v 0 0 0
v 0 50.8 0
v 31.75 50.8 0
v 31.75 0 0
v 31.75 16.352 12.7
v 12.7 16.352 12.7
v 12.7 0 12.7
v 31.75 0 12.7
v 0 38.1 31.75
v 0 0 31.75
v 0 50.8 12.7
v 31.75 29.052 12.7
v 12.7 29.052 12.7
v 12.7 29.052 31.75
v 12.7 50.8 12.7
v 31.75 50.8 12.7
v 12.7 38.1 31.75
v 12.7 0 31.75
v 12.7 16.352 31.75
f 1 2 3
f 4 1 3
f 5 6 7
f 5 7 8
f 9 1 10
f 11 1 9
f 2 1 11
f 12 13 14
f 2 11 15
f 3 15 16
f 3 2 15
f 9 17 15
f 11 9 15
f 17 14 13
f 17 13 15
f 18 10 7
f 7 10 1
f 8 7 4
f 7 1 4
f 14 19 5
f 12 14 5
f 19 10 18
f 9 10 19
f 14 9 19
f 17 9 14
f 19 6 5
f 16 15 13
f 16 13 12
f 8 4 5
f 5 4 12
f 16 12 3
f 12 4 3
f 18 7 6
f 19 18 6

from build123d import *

# Parameters (mm, degrees)
F0_W     = 31.75
F0_H     = 50.8
F1_DEPTH = 12.7
F2_W     = 12.7
F2_H     = 50.8
F3_DEPTH = 19.05
F5_DEPTH = 25.4
F6_W     = 12.7
F6_H     = 19.05
F7_DEPTH = 19.05
F9_DEPTH = 25.4


with BuildPart() as f1:
    # F0 (on Top) → F1 (new body)
    with BuildSketch(Plane.XY):
        with Locations((15.875, 25.4)):
            Rectangle(F0_W, F0_H)
    extrude(amount=F1_DEPTH)

    # F2 (on face) → F3 (join)
    with BuildSketch(Plane.XY.offset(12.7)):
        with Locations((6.35, 25.4)):
            Rectangle(F2_W, F2_H)
    extrude(amount=F3_DEPTH)

    # F4 (on face) → F5 (cut)
    with BuildSketch(Plane.YZ.offset(12.7)):
        Polygon((50.8, 12.7), (50.8, 31.75), (38.1, 31.75), align=None)
    extrude(amount=-F5_DEPTH, mode=Mode.SUBTRACT)

    # F6 (on face) → F7 (join)
    with BuildSketch(Plane.YZ.offset(12.7)):
        with Locations((22.702408, 22.225)):
            Rectangle(F6_W, F6_H)
    extrude(amount=F7_DEPTH)

    # F8 (on face) → F9 (cut)
    with BuildSketch(Plane.XZ.offset(-16.352408)):
        Polygon((31.75, 12.7), (31.75, 31.75), (12.7, 31.75), align=None)
    extrude(amount=-F9_DEPTH, mode=Mode.SUBTRACT)


solid = f1.part
